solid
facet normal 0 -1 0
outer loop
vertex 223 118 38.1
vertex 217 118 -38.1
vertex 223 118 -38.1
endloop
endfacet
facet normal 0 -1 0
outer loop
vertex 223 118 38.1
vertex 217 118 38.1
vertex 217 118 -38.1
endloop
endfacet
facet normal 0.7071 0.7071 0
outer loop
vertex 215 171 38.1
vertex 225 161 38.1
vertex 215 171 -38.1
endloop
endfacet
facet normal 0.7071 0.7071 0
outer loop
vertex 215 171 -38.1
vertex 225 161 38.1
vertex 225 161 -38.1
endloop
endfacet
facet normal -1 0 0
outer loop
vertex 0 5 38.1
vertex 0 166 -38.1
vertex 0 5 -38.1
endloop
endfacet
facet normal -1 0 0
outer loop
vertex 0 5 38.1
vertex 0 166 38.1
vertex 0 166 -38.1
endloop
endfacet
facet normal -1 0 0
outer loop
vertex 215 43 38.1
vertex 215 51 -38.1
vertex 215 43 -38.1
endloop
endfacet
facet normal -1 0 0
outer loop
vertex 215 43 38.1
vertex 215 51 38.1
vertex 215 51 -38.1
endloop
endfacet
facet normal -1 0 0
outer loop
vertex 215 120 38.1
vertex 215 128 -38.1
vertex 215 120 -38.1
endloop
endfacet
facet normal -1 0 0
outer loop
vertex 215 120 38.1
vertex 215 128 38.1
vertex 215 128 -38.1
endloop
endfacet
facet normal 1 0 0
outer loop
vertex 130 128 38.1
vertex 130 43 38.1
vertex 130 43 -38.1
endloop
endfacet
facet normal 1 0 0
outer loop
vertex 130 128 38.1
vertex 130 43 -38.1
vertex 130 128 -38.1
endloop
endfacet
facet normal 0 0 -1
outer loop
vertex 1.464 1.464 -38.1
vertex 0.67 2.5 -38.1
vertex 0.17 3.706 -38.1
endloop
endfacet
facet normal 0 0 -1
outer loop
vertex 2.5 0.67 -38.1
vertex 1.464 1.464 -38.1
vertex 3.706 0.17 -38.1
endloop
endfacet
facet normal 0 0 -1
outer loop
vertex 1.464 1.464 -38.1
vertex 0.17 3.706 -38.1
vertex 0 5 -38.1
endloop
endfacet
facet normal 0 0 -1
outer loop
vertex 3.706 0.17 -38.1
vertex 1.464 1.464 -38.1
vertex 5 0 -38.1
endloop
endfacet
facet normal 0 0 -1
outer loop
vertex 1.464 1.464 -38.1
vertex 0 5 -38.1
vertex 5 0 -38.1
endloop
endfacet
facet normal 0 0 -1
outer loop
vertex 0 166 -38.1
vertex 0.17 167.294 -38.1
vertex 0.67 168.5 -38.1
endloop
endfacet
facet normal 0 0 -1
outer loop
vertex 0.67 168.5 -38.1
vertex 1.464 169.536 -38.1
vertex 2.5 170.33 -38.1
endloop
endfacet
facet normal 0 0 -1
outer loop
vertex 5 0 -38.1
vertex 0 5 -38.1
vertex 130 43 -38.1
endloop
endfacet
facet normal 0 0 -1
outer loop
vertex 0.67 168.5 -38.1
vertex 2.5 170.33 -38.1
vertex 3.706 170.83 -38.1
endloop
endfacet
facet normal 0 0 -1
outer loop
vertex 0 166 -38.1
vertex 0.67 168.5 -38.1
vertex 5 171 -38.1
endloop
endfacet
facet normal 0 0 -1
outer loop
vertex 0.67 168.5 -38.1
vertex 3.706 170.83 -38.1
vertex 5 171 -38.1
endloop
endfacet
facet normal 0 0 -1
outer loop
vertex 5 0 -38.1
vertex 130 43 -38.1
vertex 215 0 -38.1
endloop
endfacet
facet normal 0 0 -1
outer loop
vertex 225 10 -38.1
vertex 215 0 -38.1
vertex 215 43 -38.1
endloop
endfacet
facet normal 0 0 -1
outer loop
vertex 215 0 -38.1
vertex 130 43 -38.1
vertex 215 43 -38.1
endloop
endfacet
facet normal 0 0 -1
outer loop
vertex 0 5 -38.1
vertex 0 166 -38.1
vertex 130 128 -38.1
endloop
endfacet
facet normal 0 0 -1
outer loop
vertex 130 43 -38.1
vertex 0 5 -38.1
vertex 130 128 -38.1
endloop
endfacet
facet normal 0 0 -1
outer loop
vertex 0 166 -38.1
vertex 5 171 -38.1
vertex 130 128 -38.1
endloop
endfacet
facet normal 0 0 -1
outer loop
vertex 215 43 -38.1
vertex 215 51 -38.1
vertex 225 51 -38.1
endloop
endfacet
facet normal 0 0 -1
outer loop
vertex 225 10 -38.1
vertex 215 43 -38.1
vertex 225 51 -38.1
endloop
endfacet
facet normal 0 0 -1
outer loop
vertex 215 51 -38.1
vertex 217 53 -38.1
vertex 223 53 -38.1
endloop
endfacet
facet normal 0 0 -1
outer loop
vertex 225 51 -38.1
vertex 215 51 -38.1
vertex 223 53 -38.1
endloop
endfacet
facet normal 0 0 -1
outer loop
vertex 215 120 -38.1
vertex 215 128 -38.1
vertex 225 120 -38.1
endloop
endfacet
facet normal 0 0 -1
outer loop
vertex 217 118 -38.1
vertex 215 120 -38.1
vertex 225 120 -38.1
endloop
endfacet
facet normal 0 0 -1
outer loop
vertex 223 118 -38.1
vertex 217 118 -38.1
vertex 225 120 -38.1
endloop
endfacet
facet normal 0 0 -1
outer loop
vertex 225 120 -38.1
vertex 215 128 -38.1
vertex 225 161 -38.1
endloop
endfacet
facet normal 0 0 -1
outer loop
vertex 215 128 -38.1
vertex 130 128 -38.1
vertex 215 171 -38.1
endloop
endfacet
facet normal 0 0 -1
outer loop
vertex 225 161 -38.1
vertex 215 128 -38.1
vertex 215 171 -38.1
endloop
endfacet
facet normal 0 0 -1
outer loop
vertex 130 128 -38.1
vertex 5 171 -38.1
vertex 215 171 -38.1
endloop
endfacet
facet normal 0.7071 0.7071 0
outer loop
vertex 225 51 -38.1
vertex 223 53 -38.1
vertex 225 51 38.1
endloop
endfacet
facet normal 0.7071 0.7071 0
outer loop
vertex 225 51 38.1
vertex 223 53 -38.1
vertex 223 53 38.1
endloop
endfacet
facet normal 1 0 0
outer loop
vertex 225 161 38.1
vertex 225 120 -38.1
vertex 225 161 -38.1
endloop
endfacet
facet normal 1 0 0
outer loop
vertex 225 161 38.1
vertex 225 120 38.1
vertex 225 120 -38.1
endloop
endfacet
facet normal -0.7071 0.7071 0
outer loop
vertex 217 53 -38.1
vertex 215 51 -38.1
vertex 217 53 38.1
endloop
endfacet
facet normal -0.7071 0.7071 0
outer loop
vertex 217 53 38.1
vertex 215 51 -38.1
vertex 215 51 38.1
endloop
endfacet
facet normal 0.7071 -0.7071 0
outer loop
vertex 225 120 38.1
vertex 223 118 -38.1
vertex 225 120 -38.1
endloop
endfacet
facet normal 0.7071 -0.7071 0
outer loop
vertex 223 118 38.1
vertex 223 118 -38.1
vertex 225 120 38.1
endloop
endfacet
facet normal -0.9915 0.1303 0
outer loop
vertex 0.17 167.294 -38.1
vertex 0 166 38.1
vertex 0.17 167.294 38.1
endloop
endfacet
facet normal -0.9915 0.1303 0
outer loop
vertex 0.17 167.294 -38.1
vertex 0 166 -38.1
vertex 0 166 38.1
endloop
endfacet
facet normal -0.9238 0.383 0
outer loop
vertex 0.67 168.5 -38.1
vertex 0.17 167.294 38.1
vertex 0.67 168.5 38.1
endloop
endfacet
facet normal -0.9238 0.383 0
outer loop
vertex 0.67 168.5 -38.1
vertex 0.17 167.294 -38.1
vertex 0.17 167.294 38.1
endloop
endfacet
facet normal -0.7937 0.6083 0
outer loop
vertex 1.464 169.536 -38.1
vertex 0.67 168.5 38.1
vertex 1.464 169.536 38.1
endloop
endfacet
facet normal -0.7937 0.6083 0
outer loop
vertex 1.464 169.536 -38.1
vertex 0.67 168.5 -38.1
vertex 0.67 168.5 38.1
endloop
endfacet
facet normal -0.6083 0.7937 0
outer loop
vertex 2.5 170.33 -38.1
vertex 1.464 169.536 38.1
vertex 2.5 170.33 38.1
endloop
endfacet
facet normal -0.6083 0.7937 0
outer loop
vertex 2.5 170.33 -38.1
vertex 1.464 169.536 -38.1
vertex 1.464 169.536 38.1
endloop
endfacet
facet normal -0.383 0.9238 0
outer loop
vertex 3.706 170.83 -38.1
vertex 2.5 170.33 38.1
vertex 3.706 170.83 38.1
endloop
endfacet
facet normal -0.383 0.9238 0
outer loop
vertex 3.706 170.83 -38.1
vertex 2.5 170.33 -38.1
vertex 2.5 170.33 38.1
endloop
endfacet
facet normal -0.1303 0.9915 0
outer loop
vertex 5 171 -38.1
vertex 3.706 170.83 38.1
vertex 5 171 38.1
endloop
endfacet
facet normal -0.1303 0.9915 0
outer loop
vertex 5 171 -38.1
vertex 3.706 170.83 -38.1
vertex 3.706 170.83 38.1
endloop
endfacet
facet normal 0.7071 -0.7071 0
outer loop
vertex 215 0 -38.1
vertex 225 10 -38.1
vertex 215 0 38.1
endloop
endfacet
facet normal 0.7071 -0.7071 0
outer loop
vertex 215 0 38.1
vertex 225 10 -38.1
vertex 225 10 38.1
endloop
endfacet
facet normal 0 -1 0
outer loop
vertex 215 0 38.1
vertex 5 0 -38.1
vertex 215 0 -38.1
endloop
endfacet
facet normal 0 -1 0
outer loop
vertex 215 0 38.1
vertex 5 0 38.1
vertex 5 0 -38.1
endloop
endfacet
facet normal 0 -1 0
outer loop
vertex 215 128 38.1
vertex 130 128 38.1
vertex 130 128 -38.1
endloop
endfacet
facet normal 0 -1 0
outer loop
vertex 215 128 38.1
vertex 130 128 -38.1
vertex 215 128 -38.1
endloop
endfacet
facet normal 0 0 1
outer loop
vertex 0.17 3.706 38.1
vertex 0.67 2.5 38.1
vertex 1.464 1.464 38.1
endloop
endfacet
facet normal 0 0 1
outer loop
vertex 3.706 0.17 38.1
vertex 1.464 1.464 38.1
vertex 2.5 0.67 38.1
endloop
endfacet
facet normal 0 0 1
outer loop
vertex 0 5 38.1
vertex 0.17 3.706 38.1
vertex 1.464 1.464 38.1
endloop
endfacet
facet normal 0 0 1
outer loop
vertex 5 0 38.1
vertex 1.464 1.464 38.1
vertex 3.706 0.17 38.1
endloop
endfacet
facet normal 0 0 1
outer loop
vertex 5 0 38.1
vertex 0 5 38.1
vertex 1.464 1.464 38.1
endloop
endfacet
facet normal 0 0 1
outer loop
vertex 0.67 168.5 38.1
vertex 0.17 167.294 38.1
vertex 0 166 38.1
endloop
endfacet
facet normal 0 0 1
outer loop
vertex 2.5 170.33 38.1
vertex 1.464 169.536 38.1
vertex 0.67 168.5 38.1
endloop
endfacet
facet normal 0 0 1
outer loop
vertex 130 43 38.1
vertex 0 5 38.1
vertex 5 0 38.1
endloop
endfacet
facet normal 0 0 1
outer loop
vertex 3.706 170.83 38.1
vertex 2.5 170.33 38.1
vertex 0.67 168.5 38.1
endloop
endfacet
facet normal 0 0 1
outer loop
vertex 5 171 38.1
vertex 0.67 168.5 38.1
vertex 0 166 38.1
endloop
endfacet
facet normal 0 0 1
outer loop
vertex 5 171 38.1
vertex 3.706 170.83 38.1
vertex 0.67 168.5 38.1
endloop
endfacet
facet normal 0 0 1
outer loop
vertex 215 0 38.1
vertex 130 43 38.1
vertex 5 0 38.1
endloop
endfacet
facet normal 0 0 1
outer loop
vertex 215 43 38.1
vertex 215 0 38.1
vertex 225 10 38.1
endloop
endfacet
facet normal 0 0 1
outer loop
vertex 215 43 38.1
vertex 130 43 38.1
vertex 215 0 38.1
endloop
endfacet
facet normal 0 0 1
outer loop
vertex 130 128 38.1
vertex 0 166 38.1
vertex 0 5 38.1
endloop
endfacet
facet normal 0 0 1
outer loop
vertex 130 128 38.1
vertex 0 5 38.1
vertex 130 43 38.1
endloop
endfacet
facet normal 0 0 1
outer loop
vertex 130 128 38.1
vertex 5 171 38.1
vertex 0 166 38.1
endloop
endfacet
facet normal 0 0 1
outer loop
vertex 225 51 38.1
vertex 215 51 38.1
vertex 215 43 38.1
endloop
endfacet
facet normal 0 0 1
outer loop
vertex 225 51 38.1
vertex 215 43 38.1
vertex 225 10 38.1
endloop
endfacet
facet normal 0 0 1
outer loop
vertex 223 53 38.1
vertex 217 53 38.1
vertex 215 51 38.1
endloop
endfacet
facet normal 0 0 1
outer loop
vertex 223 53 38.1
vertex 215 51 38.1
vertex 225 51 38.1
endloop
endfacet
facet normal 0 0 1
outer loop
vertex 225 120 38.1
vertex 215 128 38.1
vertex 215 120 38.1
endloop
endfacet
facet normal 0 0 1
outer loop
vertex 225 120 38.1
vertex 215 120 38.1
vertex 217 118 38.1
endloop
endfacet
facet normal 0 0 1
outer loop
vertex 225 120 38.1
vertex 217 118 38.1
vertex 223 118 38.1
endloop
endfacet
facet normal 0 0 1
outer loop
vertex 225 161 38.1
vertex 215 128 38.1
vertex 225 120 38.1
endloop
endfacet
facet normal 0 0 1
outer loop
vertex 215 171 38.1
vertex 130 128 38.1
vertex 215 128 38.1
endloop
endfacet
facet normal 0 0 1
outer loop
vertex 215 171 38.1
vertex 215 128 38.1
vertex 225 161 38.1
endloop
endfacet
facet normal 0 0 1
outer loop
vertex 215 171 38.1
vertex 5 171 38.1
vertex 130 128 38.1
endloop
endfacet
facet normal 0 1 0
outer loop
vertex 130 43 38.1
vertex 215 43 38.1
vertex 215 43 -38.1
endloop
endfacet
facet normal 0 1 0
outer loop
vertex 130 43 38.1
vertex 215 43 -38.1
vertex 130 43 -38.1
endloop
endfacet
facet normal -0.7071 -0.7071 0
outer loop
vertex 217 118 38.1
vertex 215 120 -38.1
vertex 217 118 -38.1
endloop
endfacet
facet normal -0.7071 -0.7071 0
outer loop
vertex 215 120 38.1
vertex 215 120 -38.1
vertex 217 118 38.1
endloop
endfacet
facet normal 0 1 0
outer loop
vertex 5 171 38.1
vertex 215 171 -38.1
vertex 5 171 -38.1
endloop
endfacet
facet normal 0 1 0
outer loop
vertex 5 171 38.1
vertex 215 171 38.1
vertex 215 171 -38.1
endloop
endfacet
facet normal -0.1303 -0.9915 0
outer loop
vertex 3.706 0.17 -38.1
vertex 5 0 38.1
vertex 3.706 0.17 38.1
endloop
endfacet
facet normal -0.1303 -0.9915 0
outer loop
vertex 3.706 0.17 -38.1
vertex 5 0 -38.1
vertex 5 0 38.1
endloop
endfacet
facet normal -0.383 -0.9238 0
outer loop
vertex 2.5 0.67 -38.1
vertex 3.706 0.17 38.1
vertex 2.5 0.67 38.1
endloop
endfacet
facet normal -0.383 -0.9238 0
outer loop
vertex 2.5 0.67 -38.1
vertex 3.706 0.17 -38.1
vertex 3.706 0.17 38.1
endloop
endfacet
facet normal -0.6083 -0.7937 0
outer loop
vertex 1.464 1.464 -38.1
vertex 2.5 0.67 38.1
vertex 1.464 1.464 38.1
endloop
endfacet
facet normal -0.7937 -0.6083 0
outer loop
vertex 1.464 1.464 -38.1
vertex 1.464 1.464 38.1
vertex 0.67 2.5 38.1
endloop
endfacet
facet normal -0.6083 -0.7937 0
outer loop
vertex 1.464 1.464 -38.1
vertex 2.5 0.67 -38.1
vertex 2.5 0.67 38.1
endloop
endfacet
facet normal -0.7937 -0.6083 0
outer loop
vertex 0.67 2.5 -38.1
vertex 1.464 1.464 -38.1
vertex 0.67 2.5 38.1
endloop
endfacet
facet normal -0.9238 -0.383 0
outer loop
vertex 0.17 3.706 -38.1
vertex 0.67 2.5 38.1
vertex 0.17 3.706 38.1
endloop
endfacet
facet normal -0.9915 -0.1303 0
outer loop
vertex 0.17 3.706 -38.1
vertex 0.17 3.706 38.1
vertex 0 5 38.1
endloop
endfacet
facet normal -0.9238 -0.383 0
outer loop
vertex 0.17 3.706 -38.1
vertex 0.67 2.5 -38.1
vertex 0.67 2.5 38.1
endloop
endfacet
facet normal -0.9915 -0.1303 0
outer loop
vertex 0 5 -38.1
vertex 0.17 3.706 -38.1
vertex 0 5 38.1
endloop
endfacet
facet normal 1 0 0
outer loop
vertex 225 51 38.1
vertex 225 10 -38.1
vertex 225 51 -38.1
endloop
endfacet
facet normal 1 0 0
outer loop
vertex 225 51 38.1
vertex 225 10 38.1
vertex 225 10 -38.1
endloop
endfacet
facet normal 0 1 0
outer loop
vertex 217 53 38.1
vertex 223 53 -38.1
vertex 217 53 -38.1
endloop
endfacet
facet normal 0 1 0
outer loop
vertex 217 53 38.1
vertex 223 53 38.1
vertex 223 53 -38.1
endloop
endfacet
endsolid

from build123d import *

# Parameters (mm, degrees)
BOSS_EXTRUDE1_DEPTH = 38.1
CHAMFER1_SIZE       = 10
CHAMFER2_SIZE       = 2
FILLET1_R           = 5


with BuildPart() as part:
    # Sketch1 → Boss-Extrude1 (new, symmetric)
    with BuildSketch(Plane.XY):
        Polygon((0, 0), (225, 0), (225, 53), (215, 53), (215, 43), (130, 43), (130, 128), (215, 128), (215, 118), (225, 118), (225, 171), (0, 171), align=None)
    extrude(amount=BOSS_EXTRUDE1_DEPTH, both=True)

    # Chamfer1
    chamfer1_edges = [part.edges().sort_by_distance(p)[0] for p in [
        (225, 171, 0),
        (225, 0, 0),
    ]]
    chamfer(chamfer1_edges, length=CHAMFER1_SIZE)

    # Chamfer2
    chamfer2_edges = [part.edges().sort_by_distance(p)[0] for p in [
        (225, 118, 0),
        (215, 118, 0),
        (215, 53, 0),
        (225, 53, 0),
    ]]
    chamfer(chamfer2_edges, length=CHAMFER2_SIZE)

    # Fillet1
    fillet1_edges = [part.edges().sort_by_distance(p)[0] for p in [
        (0, 171, 0),
        (0, 0, 0),
    ]]
    fillet(fillet1_edges, radius=FILLET1_R)


solid = part.part
